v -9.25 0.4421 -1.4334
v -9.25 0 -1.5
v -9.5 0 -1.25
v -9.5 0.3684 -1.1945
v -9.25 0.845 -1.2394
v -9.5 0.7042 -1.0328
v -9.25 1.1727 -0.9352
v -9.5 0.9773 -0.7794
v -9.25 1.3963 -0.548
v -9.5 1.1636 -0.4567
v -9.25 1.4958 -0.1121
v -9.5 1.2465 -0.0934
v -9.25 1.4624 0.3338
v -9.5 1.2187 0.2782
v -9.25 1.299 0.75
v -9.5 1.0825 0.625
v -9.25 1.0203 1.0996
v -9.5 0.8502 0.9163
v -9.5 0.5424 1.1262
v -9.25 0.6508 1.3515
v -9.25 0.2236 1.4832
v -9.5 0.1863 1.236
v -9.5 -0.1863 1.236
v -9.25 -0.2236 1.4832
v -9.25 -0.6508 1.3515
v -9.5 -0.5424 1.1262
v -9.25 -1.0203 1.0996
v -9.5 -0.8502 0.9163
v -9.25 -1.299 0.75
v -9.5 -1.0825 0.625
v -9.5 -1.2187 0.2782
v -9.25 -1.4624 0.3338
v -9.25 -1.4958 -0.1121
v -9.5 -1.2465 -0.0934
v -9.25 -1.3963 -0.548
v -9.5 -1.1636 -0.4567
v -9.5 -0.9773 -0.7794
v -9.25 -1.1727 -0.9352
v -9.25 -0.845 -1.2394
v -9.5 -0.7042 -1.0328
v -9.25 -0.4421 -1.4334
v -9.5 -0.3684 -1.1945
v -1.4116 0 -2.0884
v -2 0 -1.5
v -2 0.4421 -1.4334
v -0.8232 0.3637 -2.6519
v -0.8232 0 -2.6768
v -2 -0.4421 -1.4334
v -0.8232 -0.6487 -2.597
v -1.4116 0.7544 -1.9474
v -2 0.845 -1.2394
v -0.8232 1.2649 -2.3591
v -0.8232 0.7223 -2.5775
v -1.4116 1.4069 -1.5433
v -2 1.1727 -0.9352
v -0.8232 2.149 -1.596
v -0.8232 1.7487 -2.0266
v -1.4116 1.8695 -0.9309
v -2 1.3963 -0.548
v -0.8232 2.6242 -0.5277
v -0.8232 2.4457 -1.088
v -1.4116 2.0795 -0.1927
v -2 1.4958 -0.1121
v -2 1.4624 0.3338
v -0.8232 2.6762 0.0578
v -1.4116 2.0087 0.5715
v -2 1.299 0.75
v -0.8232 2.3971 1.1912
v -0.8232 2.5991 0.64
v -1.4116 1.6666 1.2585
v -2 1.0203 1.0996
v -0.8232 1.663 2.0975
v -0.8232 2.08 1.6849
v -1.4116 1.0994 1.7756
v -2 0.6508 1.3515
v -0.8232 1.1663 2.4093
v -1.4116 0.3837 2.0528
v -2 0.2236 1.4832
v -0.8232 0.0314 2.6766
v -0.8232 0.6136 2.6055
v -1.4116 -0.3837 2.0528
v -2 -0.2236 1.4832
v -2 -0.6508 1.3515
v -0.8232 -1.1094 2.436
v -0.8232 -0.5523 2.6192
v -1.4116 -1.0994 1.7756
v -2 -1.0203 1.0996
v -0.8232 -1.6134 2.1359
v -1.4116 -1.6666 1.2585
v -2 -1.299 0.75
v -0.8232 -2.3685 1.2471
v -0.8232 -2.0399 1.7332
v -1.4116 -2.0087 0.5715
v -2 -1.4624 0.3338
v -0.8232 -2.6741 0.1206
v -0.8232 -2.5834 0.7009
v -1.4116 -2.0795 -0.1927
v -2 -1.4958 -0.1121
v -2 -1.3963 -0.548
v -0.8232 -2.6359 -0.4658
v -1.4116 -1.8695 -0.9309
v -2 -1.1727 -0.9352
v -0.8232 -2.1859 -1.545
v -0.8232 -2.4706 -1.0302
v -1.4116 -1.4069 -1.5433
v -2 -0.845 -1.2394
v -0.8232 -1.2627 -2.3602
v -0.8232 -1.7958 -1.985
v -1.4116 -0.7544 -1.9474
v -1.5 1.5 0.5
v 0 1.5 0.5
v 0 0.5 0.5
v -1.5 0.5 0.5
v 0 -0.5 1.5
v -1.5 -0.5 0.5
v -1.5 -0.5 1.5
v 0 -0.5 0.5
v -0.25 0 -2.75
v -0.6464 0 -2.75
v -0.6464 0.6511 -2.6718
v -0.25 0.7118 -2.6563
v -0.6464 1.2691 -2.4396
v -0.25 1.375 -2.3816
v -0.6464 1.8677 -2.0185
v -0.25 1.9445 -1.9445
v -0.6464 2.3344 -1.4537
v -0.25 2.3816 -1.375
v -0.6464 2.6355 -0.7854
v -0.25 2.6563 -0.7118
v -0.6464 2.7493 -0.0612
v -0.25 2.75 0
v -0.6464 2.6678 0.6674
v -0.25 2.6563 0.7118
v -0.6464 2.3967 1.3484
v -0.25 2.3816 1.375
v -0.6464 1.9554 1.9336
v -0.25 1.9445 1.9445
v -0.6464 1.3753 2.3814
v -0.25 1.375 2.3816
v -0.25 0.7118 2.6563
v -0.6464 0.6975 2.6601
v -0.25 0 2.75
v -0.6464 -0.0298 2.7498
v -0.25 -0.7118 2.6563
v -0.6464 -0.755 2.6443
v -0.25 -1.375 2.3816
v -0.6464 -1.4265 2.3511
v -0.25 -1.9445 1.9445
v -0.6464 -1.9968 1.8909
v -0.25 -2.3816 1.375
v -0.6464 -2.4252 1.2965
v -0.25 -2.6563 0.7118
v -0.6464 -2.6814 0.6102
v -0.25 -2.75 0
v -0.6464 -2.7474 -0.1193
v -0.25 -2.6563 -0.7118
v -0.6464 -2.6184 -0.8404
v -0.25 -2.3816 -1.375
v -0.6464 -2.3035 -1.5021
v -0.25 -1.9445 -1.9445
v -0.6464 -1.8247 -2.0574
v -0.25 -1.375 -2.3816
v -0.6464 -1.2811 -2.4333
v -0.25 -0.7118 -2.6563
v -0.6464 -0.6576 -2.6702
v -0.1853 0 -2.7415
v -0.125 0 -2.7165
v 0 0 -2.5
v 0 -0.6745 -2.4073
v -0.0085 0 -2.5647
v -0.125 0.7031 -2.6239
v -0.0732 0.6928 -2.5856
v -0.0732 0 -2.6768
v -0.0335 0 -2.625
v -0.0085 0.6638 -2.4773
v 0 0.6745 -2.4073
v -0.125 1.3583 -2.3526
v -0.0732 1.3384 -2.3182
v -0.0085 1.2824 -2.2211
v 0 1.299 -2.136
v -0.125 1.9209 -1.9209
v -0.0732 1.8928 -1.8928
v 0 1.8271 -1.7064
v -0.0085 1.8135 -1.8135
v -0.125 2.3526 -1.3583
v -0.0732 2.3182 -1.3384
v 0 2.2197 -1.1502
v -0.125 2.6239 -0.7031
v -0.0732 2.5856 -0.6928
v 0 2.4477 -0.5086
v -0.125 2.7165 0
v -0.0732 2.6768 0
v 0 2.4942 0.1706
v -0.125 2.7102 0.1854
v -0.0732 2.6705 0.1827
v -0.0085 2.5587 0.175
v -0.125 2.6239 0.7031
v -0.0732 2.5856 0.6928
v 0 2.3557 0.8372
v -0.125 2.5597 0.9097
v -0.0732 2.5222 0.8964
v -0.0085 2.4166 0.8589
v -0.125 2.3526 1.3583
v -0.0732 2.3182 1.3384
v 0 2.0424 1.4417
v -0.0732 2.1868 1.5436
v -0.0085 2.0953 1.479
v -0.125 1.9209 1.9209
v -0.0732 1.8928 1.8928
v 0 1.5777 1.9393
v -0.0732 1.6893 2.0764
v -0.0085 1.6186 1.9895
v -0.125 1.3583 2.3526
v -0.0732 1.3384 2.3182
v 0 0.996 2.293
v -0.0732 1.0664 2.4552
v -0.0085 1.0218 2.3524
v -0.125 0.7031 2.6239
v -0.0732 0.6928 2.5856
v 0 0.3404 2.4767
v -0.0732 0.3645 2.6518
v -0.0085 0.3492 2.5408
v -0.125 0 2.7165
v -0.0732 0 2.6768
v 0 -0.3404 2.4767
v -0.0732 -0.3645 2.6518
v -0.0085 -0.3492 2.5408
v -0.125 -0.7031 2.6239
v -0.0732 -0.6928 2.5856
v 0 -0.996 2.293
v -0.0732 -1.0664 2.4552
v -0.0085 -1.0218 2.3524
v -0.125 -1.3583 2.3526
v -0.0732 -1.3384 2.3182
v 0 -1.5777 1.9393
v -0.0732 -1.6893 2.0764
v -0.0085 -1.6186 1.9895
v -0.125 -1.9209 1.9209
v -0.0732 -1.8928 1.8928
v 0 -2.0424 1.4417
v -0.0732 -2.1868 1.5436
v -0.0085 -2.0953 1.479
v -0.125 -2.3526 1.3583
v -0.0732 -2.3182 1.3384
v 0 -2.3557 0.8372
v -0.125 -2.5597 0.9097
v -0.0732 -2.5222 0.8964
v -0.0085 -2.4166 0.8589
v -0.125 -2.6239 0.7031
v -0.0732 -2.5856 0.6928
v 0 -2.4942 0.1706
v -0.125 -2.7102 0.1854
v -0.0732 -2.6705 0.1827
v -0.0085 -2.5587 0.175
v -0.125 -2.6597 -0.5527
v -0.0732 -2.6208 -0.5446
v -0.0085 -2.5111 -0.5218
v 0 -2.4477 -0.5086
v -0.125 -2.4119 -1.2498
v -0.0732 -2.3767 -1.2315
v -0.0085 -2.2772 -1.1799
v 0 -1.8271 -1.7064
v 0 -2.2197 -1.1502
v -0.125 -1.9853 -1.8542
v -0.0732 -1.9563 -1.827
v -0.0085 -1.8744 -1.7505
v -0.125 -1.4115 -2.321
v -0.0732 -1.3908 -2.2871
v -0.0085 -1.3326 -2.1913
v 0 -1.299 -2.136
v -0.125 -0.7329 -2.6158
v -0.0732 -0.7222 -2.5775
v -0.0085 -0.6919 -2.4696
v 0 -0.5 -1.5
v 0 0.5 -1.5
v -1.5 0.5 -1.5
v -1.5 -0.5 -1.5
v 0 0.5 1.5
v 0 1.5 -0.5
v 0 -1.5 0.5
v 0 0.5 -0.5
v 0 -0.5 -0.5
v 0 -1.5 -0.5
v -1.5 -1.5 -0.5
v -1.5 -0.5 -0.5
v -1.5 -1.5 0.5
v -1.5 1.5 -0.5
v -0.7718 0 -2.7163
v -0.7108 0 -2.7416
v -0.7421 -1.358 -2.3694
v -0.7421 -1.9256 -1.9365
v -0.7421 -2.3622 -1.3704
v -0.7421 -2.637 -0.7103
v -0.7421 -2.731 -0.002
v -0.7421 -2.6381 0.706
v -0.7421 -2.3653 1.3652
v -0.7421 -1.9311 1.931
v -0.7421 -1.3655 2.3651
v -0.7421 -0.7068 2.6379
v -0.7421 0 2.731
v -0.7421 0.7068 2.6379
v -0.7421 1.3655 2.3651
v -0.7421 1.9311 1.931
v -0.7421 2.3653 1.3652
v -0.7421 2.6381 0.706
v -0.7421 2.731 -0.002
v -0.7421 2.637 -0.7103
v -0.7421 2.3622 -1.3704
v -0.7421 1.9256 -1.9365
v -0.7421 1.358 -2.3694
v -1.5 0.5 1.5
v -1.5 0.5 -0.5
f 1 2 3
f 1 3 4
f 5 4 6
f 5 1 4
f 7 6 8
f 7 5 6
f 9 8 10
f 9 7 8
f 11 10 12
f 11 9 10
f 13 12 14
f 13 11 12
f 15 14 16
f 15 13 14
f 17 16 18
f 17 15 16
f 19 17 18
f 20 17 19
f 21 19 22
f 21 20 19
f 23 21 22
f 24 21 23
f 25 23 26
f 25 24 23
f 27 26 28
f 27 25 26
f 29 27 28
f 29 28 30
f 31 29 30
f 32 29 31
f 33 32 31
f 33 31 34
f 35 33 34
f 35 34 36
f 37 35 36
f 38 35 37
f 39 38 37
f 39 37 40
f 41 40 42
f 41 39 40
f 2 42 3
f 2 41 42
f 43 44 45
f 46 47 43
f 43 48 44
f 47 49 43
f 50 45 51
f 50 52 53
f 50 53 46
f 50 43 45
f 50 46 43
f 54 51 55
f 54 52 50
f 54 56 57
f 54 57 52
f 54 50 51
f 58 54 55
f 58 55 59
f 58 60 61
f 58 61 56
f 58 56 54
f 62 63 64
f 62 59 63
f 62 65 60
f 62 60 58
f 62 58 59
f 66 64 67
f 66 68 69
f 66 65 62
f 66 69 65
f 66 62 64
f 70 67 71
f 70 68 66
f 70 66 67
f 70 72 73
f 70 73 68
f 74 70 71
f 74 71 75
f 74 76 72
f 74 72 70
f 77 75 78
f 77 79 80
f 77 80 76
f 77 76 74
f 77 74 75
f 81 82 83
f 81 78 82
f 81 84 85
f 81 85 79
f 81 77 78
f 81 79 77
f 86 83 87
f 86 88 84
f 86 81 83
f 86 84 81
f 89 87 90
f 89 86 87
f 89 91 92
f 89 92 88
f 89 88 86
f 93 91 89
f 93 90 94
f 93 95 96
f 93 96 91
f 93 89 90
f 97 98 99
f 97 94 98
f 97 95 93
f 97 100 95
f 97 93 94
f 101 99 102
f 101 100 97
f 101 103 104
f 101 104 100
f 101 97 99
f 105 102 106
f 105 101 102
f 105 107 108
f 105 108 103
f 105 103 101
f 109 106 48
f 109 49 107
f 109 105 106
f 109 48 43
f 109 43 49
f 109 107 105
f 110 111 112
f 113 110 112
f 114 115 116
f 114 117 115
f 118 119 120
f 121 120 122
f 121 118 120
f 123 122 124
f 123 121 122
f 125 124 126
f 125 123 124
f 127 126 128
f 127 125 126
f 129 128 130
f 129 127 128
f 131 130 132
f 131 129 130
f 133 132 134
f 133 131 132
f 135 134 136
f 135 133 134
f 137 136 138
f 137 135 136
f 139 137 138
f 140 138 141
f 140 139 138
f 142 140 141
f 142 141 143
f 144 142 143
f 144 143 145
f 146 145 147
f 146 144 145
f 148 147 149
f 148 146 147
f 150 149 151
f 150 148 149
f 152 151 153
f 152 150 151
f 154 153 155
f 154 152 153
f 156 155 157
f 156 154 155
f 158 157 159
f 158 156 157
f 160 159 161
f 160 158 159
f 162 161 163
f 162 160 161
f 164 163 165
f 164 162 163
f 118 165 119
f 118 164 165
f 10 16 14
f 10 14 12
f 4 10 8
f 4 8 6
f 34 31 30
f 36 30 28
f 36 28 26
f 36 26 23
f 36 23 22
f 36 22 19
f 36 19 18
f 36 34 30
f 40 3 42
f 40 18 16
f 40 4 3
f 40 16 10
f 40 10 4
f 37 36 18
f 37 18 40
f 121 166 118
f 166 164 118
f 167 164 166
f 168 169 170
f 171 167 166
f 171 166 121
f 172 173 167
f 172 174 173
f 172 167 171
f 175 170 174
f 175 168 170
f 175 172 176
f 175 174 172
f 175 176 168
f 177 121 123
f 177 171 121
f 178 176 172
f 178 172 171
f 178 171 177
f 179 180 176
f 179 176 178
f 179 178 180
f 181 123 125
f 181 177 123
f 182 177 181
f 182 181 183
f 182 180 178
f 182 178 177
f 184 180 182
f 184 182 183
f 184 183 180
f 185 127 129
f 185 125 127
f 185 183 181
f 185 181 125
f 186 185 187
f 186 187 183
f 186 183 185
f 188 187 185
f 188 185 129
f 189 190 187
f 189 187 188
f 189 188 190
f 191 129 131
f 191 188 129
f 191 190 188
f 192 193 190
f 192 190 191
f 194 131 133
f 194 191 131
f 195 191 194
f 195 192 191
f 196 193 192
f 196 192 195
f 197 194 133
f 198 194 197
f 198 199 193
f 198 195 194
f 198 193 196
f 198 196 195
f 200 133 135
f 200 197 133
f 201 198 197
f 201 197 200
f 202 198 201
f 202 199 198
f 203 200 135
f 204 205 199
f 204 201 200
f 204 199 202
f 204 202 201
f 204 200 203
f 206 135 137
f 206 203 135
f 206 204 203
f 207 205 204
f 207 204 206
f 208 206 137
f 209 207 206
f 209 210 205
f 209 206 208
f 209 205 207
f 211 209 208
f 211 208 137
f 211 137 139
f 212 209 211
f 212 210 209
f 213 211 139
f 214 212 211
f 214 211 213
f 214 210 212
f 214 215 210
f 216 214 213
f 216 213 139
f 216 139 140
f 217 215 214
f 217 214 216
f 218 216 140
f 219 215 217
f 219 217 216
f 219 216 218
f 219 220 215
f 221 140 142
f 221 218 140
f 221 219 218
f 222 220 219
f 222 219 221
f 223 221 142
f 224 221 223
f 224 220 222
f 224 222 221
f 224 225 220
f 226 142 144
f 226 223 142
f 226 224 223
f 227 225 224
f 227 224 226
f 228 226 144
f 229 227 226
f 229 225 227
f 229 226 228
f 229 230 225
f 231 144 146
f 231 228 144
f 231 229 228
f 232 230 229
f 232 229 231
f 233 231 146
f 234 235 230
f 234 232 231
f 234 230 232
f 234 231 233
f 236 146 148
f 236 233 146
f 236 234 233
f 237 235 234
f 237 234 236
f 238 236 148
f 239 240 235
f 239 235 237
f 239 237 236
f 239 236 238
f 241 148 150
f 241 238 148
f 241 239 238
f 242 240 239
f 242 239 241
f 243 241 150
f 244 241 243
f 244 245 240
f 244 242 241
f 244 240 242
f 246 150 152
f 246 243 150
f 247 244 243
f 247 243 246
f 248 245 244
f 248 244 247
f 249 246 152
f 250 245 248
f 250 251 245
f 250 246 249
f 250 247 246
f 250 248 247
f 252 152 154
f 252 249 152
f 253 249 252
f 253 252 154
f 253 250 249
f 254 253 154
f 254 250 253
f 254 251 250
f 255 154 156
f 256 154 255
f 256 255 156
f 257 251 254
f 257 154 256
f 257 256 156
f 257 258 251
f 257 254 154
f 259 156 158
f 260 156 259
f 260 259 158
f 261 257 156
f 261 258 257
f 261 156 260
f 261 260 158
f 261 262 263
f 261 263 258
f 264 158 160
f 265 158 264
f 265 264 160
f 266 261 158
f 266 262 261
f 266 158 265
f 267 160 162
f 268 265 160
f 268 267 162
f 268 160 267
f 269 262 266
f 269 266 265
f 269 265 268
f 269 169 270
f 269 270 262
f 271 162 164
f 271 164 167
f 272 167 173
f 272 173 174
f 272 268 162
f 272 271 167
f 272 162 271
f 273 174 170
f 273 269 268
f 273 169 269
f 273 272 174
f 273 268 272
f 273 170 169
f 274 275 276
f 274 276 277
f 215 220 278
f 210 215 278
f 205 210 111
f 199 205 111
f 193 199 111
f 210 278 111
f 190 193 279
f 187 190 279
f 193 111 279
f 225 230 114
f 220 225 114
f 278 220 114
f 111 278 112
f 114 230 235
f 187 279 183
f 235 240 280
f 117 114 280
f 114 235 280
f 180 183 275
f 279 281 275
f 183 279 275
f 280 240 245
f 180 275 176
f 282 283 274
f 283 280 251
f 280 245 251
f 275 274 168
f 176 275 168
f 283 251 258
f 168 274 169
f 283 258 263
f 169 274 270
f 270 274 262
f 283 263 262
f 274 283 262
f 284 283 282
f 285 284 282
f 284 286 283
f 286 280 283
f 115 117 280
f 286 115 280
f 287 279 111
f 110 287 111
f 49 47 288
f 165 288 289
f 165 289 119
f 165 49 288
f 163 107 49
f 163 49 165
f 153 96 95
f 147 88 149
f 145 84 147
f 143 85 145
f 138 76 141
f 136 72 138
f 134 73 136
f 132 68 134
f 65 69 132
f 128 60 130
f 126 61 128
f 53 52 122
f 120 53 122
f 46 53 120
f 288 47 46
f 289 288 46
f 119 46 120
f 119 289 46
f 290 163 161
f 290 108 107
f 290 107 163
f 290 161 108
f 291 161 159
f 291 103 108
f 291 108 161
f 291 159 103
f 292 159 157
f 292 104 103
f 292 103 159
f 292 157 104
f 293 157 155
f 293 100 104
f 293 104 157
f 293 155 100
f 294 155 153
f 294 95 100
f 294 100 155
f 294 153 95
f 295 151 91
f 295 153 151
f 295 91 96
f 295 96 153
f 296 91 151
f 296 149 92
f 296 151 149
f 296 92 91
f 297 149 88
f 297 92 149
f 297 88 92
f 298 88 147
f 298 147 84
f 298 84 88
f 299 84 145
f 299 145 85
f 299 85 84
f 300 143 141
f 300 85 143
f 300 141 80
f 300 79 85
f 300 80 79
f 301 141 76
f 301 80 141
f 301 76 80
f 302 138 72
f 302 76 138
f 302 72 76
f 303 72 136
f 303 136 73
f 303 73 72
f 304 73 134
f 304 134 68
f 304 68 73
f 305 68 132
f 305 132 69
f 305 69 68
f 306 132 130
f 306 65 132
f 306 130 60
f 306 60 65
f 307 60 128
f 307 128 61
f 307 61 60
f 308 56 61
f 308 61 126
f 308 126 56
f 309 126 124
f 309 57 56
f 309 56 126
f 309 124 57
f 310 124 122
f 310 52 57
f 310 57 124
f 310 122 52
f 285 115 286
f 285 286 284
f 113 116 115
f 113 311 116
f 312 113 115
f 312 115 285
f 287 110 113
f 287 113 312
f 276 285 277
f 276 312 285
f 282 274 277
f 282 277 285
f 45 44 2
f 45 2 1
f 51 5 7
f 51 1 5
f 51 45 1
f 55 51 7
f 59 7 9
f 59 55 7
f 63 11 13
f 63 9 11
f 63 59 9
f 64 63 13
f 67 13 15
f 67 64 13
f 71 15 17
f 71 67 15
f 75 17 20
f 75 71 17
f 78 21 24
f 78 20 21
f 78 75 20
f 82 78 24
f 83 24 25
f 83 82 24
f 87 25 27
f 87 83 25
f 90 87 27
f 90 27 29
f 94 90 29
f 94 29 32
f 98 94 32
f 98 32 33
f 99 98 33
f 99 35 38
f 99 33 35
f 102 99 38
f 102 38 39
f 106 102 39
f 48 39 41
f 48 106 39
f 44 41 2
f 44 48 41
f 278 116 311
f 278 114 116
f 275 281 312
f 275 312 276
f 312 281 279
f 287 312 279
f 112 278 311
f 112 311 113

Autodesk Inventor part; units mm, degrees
ref_plane "YZ Plane" through (0, 0, 0) normal (1, 0, 0) x (0, 1, 0)
ref_plane "XZ Plane" through (0, 0, 0) normal (0, 1, 0) x (-1, 0, 0)
ref_plane "XY Plane" through (0, 0, 0) normal (0, 0, 1) x (1, 0, 0)
sketch "Sketch1" plane through (0, 0, 0) normal (0, 1, 0) x (-1, 0, 0)
  line L0 (0, 0) -> (0, -2.75)
  line L1 (0, 0) -> (9.5, 0)
  line L2 (9.5, 0) -> (9.5, -1.5)
  line L3 (9.5, -1.5) -> (2, -1.5)
  line L4 (2, -1.5) -> (0.75, -2.75)
  line L5 (2, -1.5) -> (3.7678, -1.5) construction
  line L6 (0.75, -2.75) -> (0, -2.75)
  dimension "d0" = 2.75
  dimension "d1" = 9.5
  dimension "d2" = 1.5
  dimension "d3" = 7.5
  dimension "d4" = 135
revolve "Revolution1" add sketch "Sketch1" angle 360 about axis through (0, 0, 0) along (-1, 0, 0)
thread "Thread1" size "M3x0.5" class "6g" standard "ANSI Metric M Profile" full length
fillet "Fillet1" radius 0.25 2 edges at (-0.75, 0, 2.75) (0, 0, 2.75)
sketch "Sketch2" plane through (0, 0, 0) normal (1, 0, 0) x (0, 0, -1)
  line L0 (-1.5, 0.5) -> (1.5, 0.5)
  line L1 (1.5, 0.5) -> (1.5, -0.5)
  line L2 (1.5, -0.5) -> (-1.5, -0.5)
  line L3 (-1.5, -0.5) -> (-1.5, 0.5)
  line L4 (-1.5, 0.5) -> (1.5, -0.5) construction
  line L5 (1.5, 0.5) -> (-1.5, -0.5) construction
  line L6 (0.5, 1.5) -> (-0.5, 1.5)
  line L7 (-0.5, 1.5) -> (-0.5, -1.5)
  line L8 (-0.5, -1.5) -> (0.5, -1.5)
  line L9 (0.5, -1.5) -> (0.5, 1.5)
  line L10 (0.5, 1.5) -> (-0.5, -1.5) construction
  line L11 (-0.5, 1.5) -> (0.5, -1.5) construction
  point P0 (0, 0)
  point P1 (0.5, 0.5)
  point P2 (-0.5, 0.5)
  point P3 (-0.5, -0.5)
  point P4 (0.5, -0.5)
  dimension "d9" = 3
  dimension "d10" = 1
  dimension "d11" = 1
  dimension "d12" = 3
extrude "Extrusion1" cut sketch "Sketch2" against normal blind 1.5
chamfer "Chamfer1" distance 0.25 angle 45 1 edges at (-9.5, 0, 1.5)
properties part number "M3_Short_Bolt" material "Steel, Alloy"
